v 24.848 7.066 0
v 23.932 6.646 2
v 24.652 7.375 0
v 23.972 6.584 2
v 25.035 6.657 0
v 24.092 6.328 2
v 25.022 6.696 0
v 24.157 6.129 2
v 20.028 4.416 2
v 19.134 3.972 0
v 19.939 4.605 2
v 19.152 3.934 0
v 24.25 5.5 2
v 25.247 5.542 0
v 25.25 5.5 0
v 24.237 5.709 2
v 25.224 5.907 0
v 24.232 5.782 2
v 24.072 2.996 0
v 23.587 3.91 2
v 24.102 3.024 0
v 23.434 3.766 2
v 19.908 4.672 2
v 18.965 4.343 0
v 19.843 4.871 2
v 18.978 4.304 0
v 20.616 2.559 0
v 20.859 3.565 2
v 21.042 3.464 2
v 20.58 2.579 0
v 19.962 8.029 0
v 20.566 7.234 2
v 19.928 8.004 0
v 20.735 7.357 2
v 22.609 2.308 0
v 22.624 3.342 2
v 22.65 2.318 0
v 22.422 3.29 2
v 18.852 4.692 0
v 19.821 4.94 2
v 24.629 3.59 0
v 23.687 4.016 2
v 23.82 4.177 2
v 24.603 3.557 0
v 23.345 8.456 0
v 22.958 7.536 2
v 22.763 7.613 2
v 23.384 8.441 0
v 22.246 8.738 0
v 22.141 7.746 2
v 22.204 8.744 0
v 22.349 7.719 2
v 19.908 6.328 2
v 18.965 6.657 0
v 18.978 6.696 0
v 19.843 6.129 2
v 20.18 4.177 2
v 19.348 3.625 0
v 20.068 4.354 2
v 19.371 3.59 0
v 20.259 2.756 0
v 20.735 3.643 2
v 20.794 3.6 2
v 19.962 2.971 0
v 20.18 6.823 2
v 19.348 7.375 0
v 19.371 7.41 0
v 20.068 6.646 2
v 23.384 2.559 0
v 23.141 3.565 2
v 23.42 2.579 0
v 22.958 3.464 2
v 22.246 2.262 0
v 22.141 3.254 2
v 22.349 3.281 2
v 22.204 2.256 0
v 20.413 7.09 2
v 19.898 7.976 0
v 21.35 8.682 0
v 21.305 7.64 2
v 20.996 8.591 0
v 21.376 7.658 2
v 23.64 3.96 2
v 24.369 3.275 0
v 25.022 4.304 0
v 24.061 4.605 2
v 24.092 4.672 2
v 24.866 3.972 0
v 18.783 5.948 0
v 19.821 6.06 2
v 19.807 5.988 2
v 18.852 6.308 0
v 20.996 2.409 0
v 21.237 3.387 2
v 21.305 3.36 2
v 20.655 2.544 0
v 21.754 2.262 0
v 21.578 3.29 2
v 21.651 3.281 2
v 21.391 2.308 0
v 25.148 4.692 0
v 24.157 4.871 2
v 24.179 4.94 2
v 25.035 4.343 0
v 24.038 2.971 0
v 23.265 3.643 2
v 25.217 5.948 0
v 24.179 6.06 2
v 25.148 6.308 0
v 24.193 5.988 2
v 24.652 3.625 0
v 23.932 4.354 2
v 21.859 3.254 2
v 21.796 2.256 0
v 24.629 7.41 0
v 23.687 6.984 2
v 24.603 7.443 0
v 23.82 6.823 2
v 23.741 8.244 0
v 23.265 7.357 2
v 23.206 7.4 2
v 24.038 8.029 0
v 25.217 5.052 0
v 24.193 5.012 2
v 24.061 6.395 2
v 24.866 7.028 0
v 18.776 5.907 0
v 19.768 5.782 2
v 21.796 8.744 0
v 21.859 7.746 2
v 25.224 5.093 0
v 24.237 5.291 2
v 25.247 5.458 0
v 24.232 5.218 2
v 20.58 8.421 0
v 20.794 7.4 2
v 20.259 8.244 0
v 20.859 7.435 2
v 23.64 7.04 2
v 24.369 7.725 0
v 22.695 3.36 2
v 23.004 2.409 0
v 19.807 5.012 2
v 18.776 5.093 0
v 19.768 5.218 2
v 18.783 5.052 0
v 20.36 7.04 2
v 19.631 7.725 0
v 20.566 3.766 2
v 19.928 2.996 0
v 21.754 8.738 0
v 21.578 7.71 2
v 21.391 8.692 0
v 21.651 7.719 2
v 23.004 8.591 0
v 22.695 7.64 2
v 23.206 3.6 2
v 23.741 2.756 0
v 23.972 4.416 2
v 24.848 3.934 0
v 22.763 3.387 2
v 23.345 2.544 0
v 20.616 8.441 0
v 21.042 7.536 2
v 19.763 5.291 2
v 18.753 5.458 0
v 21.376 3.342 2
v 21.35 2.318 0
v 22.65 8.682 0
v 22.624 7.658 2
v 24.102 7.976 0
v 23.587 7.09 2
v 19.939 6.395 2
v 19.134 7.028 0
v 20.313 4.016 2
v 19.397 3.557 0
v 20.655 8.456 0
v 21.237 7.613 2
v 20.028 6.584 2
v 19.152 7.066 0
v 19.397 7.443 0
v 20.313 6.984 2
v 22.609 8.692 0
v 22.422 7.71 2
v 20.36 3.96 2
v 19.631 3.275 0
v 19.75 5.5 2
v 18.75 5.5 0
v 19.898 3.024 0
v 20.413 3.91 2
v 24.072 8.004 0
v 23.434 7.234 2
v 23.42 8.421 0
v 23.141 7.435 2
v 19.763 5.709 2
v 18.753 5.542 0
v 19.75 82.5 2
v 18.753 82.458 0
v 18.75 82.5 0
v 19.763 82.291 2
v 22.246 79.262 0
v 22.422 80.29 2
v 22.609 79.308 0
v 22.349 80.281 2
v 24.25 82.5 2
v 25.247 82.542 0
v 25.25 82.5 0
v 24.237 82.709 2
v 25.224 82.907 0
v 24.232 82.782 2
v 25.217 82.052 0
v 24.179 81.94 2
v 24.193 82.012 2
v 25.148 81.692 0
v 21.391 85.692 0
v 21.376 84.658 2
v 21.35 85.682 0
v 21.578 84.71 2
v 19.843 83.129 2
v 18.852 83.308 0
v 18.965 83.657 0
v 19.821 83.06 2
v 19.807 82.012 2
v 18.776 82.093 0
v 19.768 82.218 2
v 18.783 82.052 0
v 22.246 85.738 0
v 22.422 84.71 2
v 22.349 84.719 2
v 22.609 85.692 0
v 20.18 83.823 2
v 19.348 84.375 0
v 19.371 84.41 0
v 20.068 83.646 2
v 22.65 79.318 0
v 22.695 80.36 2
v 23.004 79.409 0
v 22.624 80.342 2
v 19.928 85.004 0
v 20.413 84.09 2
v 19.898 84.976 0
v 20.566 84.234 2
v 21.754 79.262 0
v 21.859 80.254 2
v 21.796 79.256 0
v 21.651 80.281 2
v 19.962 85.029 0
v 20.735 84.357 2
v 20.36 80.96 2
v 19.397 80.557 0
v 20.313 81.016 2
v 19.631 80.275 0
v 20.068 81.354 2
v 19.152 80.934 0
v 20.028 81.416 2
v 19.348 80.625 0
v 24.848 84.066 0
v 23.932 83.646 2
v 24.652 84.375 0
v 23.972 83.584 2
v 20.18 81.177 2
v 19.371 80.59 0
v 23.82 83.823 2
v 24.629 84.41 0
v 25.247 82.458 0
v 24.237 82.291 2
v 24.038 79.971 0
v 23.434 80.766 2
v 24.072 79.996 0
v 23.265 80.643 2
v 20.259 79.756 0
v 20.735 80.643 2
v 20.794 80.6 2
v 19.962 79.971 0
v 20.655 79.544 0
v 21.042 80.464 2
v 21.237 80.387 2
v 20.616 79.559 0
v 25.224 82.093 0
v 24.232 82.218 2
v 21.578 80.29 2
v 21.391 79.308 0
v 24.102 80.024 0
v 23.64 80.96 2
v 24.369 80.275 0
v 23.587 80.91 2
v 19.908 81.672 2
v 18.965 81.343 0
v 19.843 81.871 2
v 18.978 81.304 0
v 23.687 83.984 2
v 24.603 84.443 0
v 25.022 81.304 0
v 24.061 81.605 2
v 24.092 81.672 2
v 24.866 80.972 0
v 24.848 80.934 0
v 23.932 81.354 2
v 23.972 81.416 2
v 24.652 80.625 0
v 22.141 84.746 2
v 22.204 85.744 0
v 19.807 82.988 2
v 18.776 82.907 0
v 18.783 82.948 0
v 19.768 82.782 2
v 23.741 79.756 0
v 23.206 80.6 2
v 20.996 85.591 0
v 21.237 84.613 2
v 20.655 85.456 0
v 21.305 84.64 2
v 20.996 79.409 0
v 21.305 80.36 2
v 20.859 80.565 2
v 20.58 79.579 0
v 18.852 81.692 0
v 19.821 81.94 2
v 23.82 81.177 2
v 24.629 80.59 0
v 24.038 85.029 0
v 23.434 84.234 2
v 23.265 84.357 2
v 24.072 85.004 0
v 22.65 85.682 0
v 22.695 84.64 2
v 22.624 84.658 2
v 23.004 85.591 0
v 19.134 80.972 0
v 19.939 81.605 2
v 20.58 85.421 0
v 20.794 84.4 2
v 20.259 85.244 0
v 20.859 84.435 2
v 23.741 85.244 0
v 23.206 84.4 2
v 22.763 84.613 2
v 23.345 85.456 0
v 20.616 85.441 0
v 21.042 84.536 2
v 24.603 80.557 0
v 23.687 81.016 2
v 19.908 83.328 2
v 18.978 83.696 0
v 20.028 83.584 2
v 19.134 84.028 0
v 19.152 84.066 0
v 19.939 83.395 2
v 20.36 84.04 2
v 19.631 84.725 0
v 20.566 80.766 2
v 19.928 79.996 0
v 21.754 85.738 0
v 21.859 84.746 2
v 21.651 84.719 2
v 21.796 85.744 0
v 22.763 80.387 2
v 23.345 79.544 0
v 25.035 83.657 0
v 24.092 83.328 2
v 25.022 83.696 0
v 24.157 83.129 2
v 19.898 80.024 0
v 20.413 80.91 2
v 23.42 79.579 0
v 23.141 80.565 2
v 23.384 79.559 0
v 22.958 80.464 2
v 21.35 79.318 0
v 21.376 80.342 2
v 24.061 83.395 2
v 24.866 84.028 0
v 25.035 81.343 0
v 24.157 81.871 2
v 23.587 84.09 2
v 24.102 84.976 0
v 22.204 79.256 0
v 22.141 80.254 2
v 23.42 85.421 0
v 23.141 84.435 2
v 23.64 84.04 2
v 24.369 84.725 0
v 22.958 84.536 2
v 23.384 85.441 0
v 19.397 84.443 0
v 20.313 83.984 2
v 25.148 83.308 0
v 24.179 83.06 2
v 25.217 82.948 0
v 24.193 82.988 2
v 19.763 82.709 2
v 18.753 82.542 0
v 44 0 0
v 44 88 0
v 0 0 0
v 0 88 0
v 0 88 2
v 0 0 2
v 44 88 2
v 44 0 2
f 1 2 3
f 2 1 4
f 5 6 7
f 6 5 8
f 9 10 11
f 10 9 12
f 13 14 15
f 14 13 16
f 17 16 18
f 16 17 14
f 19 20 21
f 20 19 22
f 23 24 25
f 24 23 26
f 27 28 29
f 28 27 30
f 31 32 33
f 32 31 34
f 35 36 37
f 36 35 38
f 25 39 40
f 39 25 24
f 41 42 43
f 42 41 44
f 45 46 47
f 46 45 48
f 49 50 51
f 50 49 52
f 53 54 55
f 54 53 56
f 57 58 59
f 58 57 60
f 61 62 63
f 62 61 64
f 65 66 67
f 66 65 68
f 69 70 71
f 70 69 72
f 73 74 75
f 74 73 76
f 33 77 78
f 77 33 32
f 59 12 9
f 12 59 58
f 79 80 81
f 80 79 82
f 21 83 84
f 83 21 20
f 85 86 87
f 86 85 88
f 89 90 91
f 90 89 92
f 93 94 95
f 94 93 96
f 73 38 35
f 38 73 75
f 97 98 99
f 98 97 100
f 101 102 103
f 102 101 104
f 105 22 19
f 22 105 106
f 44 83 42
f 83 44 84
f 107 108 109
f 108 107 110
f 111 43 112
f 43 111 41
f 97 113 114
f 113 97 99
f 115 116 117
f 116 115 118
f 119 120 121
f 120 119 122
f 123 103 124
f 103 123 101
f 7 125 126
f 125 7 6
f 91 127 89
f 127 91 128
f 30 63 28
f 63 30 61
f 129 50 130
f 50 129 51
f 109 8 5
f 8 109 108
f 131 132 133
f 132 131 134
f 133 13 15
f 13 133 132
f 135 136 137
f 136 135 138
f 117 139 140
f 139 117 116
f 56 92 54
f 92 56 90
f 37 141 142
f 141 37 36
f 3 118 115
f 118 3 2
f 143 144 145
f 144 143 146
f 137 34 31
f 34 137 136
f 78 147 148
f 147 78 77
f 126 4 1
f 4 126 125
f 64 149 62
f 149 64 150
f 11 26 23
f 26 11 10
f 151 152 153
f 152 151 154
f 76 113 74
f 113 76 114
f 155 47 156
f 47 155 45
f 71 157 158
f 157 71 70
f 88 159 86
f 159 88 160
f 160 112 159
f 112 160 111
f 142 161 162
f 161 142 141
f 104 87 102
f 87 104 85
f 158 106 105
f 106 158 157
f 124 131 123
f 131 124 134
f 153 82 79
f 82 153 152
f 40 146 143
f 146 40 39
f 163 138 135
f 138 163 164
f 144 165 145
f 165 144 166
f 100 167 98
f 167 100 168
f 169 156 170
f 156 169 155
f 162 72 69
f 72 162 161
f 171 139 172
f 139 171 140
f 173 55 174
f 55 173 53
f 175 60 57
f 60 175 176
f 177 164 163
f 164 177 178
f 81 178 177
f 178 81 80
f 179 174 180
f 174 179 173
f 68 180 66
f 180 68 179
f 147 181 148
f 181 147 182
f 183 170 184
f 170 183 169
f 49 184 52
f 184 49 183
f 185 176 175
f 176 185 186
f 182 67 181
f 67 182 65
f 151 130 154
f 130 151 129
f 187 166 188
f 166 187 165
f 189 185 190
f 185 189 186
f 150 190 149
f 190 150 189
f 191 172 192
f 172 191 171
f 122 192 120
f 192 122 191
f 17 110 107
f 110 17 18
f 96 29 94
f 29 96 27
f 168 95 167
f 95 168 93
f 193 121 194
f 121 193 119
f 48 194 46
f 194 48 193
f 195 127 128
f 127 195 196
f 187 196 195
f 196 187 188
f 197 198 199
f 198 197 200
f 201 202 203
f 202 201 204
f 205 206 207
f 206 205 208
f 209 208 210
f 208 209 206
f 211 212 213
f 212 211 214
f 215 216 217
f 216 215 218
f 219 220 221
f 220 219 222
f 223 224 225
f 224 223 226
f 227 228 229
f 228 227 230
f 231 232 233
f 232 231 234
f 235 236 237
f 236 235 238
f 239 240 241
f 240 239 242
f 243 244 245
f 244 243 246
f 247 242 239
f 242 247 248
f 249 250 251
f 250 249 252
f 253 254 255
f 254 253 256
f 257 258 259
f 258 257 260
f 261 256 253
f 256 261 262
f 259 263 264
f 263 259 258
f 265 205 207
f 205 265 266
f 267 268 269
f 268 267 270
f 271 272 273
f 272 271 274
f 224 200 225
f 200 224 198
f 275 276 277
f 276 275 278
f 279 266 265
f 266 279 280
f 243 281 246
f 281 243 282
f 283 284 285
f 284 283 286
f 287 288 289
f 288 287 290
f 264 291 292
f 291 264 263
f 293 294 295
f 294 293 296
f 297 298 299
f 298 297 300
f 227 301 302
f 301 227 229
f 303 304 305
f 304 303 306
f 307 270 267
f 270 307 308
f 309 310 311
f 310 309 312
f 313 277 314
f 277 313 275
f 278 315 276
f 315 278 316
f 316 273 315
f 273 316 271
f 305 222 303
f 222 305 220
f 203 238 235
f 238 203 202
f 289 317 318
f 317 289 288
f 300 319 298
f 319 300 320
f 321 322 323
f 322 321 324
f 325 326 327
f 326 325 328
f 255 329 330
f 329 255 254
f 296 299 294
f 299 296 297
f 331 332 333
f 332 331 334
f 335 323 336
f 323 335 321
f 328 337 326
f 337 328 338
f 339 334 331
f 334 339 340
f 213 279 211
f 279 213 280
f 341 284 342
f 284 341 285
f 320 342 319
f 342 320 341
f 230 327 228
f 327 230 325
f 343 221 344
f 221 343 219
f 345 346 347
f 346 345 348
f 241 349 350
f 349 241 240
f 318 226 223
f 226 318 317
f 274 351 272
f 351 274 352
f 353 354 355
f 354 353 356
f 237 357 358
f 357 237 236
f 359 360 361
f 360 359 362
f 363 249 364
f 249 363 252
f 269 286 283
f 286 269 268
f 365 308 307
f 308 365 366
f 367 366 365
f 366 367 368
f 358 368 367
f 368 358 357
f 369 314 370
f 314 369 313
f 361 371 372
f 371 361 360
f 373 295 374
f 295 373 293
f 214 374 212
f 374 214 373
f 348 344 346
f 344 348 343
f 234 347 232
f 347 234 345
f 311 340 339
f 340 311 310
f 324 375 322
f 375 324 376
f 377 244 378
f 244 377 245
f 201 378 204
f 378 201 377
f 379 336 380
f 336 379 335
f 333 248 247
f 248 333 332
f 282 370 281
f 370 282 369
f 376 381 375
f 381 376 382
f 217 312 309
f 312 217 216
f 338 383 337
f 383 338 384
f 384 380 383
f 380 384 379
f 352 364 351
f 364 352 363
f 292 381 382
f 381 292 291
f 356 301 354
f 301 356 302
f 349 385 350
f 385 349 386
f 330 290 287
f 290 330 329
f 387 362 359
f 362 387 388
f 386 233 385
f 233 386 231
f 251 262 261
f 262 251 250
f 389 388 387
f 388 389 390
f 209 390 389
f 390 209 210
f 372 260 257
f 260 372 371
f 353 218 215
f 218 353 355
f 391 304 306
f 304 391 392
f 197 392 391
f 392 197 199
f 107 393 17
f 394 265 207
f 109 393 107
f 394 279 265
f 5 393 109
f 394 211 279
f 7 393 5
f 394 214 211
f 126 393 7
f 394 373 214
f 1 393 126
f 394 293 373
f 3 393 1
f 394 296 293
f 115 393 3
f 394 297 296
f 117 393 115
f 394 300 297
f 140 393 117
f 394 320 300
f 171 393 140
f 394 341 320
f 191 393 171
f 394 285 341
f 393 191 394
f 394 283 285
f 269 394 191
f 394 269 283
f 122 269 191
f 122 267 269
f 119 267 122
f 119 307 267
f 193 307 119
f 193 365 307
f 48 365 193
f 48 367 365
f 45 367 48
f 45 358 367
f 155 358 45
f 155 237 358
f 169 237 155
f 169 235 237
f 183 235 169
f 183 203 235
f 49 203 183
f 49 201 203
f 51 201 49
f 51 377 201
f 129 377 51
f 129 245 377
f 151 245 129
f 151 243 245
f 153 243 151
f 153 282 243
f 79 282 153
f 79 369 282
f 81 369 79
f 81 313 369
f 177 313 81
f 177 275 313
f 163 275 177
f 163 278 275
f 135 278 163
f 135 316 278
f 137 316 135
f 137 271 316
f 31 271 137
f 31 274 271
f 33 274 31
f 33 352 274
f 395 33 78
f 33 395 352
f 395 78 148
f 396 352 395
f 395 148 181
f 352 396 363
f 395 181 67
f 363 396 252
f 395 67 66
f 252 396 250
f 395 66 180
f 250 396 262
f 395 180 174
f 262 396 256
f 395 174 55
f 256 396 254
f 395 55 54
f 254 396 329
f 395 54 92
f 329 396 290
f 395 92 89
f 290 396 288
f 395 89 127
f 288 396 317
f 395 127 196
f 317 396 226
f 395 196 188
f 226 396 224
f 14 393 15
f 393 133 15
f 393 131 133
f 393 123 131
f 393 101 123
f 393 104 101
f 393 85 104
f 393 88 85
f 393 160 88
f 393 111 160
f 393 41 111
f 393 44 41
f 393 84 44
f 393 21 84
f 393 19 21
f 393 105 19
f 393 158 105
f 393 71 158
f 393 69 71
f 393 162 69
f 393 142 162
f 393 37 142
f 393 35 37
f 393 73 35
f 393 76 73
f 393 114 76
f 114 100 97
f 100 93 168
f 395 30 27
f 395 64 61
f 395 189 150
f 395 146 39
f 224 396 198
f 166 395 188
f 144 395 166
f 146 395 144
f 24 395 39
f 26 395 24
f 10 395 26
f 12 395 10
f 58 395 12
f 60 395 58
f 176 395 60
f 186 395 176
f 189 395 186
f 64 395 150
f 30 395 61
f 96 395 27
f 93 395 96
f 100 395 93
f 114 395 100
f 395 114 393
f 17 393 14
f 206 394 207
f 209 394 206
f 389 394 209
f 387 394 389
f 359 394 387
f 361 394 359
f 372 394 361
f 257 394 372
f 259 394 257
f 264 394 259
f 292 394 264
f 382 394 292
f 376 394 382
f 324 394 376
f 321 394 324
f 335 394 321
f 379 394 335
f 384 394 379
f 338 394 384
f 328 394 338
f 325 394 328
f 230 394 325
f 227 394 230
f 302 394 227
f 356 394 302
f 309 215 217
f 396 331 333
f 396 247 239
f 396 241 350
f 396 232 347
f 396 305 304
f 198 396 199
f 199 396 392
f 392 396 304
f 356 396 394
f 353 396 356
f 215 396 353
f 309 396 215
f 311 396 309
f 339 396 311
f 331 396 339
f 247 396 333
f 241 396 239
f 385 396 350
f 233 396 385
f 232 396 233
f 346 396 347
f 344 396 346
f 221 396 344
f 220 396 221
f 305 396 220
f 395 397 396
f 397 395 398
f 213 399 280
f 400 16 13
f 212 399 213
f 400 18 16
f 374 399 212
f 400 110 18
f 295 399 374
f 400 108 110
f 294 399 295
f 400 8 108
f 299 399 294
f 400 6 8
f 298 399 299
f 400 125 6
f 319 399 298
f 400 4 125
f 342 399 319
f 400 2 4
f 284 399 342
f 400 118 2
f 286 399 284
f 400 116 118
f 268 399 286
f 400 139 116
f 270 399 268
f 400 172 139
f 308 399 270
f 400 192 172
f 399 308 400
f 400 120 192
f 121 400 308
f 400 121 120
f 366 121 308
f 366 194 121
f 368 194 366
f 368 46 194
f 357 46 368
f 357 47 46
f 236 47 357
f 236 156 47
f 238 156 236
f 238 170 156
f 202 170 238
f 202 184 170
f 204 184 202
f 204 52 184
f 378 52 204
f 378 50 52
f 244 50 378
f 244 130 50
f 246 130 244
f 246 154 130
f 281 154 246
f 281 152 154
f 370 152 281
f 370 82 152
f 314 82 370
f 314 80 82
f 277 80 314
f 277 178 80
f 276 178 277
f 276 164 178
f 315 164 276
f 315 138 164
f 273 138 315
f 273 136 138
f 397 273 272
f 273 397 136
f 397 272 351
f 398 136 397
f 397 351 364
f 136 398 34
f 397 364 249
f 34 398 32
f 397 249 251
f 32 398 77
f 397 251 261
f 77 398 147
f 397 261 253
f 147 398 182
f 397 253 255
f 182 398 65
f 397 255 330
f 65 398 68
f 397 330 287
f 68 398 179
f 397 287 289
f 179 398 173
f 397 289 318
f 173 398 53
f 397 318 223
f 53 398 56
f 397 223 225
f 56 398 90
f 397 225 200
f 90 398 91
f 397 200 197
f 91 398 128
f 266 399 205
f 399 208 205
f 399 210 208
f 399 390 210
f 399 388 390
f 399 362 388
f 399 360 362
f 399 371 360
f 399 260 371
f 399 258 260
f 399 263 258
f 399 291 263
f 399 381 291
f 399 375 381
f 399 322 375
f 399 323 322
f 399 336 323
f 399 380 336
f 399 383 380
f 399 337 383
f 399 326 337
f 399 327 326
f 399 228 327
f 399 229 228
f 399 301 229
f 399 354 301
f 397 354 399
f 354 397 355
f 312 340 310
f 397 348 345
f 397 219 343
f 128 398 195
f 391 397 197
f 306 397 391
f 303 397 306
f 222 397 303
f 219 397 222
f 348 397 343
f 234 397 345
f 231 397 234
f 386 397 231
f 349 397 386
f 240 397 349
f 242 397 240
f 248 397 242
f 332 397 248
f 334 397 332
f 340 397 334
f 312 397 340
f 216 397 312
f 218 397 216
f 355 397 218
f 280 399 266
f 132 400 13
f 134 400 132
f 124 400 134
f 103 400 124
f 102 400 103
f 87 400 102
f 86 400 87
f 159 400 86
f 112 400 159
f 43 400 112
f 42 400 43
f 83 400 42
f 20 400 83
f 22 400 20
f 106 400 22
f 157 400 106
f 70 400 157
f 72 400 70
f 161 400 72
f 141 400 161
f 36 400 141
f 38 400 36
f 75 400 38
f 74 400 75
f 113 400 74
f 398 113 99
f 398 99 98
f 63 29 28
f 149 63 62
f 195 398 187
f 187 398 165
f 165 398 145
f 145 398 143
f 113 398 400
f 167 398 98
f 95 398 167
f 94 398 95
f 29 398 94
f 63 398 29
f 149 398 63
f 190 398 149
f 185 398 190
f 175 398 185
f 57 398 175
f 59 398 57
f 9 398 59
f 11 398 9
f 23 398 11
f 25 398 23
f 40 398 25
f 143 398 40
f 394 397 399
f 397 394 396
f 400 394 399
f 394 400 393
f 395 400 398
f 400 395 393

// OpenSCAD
faceplate(1);

module faceplate(slots=1) {
    $fn=50;
    eps = 1;
    _1u = 44;
    face = [slots * _1u, _1u * 2, 2];
    holeOffset = 5.5;

    difference() {
        linear_extrude(face.z) square([face.x, face.y]);    
        
        //fixing screw holes
        for (i = [1:2:slots*2]) {
            translate([_1u/2 * i, 0, -eps / 2]) {
                translate([0, holeOffset, 0]) cylinder(h=face.z+eps, d1=7, d2=4);
                translate([0, face.y - holeOffset, 0]) cylinder(h=face.z+eps, d1=7, d2=4);
            }  
        }
    }
}

module screwHoles() {
}
